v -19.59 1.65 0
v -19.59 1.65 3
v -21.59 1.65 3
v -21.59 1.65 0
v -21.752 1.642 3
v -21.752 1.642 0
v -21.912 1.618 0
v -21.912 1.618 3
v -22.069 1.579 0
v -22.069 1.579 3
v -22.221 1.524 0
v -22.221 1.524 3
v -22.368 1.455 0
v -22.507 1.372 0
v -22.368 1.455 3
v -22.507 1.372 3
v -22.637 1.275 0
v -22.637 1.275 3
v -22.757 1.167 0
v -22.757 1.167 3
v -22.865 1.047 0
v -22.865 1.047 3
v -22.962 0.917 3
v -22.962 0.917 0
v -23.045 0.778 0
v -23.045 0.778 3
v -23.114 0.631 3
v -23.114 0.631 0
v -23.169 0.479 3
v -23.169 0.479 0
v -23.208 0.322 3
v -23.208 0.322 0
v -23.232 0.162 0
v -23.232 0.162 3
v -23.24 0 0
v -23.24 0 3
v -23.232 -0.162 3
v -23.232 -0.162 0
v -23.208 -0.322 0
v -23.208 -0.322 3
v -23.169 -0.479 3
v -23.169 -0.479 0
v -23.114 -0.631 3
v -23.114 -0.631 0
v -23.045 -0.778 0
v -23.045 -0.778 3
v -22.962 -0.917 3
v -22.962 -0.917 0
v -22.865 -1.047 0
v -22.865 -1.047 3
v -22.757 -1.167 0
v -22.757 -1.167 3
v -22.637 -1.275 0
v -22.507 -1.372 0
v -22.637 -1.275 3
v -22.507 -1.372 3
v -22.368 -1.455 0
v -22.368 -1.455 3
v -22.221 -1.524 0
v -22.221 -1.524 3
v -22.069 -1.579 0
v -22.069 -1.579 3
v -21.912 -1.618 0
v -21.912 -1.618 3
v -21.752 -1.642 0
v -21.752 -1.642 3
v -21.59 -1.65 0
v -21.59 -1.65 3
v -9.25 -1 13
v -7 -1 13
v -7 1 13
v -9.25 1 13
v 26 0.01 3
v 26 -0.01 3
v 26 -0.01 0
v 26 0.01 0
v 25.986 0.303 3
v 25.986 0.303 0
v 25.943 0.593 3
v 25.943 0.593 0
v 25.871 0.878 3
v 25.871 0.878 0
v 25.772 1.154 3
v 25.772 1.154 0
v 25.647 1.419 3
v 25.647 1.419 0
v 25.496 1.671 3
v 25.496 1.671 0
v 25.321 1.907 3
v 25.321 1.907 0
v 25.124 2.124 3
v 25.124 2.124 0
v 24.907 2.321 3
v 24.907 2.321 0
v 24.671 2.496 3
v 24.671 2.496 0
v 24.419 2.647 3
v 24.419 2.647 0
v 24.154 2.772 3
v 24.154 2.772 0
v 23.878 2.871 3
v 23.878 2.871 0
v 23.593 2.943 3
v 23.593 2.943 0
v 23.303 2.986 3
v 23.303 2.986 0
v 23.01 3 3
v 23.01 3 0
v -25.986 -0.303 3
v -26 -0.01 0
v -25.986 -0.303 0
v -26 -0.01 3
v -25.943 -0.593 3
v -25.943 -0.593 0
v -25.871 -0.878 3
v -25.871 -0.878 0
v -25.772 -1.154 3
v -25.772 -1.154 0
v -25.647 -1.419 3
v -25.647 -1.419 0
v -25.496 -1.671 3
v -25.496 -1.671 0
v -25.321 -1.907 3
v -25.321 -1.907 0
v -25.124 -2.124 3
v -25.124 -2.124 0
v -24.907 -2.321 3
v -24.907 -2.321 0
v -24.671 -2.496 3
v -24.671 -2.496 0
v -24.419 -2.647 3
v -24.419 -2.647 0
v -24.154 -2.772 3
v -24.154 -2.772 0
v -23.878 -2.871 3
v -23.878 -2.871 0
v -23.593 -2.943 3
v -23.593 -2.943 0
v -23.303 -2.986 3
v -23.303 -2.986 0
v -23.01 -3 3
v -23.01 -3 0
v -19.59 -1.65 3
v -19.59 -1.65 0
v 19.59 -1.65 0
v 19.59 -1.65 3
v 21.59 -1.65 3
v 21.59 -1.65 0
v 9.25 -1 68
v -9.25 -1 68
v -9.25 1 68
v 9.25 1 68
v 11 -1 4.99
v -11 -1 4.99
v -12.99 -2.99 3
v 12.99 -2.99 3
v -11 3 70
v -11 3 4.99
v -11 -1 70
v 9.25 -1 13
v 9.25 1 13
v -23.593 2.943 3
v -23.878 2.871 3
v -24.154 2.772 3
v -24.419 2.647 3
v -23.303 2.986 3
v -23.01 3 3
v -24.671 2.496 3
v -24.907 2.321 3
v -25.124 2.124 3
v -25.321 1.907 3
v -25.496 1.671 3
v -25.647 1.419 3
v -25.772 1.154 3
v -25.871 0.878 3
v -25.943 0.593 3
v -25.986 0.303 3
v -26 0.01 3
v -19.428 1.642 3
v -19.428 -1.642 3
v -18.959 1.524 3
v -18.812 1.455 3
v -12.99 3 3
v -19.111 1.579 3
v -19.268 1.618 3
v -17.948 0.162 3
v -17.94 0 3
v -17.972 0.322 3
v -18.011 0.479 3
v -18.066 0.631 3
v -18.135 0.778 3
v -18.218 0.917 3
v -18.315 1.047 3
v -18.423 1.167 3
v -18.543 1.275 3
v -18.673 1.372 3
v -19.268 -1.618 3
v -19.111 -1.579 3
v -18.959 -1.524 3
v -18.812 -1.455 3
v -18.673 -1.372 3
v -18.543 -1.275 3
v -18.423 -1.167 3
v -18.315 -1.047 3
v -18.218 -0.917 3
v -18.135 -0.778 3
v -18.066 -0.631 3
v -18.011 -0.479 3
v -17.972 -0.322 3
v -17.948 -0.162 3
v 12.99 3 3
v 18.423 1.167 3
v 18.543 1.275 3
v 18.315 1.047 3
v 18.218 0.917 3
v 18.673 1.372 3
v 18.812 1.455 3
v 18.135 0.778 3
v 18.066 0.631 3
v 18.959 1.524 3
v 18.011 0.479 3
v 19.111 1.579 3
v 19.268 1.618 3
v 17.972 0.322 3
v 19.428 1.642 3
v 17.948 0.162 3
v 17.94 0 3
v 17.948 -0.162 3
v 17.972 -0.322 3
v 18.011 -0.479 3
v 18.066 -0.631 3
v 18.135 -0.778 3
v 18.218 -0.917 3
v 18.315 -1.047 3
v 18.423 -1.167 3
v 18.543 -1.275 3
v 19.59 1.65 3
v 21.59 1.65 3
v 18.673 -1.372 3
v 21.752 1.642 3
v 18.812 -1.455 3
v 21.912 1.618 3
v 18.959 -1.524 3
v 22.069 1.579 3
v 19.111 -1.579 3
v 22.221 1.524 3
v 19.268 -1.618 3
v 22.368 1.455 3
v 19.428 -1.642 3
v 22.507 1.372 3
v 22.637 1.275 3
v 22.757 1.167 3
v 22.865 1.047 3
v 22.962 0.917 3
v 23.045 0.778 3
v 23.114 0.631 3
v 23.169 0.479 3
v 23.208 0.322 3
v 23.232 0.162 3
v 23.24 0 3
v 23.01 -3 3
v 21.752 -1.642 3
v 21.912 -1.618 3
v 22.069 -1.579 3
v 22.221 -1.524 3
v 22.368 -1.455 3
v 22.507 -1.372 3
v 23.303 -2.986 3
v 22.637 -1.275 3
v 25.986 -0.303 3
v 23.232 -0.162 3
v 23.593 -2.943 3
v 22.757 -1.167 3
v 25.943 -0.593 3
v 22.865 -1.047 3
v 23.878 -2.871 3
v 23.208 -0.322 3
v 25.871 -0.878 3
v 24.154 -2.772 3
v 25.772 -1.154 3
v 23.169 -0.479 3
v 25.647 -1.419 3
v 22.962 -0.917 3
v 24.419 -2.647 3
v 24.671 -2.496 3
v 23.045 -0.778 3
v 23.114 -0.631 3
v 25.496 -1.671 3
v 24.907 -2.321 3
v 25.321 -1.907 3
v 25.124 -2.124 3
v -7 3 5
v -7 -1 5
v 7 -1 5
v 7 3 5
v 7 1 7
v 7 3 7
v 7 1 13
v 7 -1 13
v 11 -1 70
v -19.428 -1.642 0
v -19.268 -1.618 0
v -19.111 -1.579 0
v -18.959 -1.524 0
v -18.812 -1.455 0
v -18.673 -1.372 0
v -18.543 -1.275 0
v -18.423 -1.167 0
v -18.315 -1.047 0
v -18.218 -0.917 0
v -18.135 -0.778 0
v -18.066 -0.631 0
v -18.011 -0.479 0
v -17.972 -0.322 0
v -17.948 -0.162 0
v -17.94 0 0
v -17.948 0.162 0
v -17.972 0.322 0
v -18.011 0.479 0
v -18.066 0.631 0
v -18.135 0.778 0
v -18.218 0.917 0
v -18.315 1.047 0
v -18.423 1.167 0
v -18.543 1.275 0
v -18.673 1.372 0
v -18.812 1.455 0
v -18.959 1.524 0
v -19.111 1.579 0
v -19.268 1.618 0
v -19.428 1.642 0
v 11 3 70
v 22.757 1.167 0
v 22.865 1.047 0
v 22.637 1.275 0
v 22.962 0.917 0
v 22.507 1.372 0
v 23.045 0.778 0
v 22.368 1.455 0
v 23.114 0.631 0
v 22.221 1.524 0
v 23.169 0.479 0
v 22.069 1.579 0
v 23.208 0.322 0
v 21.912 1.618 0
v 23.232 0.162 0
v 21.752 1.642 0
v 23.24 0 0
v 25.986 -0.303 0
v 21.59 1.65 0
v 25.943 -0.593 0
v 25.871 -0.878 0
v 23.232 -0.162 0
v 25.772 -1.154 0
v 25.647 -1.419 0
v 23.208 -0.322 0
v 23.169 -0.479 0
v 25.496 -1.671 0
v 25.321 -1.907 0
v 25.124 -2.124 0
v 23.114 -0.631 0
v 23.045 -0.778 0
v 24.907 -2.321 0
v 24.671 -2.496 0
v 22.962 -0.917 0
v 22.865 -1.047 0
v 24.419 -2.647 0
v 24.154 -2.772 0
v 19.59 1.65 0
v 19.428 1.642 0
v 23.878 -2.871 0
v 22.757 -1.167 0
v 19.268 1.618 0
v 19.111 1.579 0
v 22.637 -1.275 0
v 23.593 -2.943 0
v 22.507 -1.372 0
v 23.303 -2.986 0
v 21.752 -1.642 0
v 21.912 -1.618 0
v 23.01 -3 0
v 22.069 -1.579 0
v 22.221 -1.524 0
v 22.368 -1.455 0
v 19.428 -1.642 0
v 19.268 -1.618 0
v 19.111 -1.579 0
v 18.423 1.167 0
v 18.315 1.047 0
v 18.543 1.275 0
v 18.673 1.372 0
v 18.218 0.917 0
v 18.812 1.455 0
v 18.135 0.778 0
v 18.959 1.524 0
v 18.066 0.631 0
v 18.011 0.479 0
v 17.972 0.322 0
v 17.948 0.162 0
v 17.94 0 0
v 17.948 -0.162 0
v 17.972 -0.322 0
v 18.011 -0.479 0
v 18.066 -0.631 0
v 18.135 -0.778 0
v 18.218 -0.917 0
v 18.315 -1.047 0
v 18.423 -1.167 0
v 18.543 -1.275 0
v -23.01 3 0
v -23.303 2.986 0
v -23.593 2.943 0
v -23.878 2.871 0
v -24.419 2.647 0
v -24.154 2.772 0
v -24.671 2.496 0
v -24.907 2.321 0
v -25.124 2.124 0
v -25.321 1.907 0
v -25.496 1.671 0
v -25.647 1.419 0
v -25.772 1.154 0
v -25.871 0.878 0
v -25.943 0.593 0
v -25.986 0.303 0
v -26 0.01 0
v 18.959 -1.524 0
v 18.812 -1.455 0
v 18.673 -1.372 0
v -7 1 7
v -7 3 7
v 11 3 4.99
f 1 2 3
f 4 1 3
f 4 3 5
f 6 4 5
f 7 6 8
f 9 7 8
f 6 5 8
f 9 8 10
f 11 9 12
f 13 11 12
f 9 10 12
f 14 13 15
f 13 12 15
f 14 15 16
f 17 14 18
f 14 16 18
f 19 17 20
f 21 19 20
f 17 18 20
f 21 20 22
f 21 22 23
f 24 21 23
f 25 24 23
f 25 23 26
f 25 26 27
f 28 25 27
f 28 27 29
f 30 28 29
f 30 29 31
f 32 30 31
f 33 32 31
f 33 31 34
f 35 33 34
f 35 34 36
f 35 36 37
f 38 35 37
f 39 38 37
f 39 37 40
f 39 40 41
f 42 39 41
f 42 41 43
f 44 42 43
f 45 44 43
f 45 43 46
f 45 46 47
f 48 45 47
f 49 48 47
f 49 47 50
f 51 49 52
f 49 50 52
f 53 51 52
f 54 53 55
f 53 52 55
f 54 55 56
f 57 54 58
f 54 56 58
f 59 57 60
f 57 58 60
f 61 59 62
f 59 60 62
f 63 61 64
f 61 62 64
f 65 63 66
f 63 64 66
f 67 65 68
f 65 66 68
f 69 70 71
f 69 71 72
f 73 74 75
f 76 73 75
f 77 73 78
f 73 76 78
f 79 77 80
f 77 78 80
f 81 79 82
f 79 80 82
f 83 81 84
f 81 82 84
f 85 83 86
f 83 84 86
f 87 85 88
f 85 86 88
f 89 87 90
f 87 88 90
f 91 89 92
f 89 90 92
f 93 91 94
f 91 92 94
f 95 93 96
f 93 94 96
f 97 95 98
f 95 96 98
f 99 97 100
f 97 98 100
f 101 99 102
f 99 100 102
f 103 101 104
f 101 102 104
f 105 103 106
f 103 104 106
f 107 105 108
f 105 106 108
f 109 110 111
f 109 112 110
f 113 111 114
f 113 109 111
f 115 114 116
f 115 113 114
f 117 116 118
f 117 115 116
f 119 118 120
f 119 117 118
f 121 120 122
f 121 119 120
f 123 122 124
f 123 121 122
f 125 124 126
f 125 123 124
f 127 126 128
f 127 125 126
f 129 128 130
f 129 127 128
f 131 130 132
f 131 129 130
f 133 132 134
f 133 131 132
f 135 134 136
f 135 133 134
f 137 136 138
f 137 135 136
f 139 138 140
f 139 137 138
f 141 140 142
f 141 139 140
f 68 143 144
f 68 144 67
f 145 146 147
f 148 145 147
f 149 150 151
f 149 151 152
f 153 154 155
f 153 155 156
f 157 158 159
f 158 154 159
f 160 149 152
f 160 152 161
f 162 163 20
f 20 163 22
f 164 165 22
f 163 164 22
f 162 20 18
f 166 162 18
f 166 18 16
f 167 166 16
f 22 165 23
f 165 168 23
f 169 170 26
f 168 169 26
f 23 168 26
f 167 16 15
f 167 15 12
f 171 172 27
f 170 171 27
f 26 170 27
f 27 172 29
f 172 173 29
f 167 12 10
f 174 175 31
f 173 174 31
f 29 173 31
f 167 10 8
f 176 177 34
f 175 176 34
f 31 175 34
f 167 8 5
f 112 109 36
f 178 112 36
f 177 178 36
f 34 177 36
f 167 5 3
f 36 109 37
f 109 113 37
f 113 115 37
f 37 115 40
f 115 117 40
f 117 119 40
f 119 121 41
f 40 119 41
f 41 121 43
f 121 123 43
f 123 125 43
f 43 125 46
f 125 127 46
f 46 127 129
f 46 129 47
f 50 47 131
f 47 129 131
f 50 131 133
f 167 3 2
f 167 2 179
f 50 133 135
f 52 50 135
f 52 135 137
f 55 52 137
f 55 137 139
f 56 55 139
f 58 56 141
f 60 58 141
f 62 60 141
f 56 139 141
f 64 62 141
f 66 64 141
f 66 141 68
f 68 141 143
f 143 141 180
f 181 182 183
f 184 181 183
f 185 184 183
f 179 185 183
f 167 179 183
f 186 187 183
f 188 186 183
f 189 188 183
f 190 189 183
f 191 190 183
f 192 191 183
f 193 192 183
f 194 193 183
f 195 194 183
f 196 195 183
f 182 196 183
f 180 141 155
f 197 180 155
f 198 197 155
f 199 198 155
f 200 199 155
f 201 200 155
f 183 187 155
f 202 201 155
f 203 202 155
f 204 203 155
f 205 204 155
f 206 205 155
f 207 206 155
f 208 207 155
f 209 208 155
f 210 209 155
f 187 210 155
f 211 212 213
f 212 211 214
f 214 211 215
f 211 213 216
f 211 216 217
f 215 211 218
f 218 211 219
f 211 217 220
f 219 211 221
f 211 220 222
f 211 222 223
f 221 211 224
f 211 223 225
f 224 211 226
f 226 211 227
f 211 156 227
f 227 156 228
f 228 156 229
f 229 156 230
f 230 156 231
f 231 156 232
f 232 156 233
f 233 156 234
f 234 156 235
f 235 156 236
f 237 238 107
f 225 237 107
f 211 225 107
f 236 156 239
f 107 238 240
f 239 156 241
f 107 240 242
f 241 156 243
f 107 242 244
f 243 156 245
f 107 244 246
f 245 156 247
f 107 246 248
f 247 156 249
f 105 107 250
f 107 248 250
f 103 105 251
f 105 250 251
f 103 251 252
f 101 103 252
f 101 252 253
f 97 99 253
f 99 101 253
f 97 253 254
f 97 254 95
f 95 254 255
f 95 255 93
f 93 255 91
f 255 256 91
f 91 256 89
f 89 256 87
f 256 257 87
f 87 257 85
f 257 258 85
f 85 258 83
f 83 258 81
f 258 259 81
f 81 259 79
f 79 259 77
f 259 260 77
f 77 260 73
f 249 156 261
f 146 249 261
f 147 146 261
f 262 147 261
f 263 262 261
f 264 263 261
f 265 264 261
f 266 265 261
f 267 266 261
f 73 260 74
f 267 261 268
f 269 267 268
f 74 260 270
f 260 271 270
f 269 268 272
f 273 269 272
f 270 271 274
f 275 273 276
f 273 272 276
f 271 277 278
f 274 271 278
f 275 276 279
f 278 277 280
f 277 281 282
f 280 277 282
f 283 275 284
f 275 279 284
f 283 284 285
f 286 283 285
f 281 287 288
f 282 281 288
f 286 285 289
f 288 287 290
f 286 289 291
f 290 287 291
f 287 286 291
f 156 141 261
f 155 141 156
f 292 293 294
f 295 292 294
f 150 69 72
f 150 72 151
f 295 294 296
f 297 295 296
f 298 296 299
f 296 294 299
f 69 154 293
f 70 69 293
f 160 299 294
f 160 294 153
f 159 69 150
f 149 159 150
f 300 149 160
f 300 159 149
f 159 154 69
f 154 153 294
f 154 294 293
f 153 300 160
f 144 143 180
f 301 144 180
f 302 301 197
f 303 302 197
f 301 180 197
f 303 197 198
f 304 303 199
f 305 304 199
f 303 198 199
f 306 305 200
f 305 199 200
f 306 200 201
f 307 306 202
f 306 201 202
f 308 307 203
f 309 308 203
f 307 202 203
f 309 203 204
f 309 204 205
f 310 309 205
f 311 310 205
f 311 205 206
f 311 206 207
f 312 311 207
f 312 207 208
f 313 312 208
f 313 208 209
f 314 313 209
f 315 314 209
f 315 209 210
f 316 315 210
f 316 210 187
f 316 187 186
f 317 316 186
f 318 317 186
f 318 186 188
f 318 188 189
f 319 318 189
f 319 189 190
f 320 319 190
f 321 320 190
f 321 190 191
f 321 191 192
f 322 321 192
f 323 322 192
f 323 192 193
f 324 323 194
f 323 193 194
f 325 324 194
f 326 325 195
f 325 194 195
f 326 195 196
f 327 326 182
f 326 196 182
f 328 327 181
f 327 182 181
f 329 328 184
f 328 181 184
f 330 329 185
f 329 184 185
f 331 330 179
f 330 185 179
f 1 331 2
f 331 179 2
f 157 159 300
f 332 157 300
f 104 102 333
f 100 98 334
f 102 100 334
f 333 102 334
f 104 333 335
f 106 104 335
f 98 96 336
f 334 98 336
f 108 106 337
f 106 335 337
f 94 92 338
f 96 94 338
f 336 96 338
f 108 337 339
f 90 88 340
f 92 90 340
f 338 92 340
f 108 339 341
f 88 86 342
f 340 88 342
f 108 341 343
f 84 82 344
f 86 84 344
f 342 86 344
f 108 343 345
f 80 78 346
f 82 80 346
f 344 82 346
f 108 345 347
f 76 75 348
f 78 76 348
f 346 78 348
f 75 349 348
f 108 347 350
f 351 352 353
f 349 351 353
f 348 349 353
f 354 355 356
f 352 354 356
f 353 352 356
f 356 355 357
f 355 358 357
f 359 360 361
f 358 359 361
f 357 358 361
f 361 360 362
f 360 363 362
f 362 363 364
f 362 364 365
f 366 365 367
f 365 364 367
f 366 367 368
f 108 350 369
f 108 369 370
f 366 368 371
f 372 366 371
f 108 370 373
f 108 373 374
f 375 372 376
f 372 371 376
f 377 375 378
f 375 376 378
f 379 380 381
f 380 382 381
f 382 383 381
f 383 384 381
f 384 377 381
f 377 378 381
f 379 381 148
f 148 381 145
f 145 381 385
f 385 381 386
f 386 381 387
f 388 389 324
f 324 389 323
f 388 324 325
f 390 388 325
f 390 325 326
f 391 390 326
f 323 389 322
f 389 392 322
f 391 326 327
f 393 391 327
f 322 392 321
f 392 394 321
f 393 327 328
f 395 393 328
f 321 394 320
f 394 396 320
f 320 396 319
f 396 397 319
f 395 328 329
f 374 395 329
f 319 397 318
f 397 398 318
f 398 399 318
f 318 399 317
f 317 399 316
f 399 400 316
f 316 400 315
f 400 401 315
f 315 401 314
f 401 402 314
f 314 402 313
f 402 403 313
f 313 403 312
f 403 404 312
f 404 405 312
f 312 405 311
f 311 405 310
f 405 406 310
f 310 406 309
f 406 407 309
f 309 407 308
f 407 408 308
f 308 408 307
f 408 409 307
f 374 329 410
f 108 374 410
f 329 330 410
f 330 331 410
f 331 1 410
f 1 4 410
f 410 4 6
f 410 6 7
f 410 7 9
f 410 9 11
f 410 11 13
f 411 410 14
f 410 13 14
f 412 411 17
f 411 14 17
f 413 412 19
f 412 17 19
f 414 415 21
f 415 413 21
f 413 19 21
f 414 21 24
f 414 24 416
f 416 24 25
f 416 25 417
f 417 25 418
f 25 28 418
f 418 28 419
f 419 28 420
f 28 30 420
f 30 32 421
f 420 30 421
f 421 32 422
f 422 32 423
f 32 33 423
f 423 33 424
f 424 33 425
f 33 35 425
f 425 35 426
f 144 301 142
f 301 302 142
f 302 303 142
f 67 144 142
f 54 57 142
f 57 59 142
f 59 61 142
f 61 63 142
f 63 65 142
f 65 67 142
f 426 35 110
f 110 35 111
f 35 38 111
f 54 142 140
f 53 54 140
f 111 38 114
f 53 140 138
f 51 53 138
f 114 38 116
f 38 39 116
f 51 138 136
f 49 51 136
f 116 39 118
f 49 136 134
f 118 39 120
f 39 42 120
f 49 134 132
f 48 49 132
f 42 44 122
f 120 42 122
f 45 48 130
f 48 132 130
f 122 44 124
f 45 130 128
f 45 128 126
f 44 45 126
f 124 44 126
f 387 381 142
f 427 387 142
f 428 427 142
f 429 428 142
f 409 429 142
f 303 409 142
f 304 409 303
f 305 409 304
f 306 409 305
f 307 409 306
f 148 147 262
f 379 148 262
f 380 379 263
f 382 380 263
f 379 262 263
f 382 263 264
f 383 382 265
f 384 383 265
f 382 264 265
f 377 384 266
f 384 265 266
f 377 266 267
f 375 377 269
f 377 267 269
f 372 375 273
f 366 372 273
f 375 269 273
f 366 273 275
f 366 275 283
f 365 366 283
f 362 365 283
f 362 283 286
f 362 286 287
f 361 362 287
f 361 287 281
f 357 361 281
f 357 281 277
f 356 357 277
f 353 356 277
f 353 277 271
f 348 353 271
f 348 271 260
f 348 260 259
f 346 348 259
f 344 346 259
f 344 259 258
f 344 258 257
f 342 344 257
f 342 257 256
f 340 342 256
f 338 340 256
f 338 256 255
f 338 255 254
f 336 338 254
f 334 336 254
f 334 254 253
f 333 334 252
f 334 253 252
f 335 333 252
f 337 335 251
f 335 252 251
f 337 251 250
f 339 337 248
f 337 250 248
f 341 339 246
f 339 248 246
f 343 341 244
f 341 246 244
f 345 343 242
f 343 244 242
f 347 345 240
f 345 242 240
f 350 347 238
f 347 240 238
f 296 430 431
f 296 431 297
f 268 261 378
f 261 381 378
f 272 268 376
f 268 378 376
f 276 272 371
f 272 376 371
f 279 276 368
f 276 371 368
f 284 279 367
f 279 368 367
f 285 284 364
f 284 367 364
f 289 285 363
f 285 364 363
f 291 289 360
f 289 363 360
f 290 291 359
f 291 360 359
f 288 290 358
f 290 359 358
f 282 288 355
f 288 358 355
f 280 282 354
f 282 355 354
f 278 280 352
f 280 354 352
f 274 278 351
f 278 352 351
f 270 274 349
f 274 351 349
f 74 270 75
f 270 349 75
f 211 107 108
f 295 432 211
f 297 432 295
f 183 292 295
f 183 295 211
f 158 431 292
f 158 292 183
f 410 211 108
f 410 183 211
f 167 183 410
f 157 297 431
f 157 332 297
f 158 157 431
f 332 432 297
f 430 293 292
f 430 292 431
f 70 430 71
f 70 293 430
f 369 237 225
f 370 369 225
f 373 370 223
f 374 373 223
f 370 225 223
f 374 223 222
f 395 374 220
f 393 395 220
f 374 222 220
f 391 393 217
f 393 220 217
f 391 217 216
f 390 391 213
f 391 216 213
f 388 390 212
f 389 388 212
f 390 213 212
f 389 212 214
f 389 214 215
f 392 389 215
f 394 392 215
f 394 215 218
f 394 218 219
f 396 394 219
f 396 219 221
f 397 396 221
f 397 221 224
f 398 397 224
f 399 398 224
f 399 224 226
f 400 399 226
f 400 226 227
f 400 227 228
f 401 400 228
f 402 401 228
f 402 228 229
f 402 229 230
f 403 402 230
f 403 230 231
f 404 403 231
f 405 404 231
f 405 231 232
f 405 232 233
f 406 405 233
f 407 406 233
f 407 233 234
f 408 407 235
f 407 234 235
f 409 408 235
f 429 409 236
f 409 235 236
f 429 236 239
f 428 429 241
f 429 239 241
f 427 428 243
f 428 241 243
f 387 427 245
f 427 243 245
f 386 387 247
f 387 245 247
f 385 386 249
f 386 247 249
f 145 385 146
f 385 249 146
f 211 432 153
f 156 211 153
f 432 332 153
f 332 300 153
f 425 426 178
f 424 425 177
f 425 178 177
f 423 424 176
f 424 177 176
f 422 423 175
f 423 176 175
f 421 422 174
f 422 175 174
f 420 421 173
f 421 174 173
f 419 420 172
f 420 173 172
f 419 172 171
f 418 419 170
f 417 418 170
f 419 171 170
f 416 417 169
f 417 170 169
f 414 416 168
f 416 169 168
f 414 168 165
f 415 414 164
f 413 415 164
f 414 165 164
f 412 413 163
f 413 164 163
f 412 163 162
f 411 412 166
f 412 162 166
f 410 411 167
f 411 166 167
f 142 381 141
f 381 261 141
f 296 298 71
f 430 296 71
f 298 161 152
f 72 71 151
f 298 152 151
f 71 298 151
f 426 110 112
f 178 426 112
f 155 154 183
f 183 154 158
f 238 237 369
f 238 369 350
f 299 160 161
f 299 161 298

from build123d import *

# Parameters (mm, degrees)
SKETCH_W        = 14
SKETCH_H        = 2
PAD_DEPTH       = 3
SKETCH001_W     = 22
SKETCH001_H     = 70
POCKET_DEPTH    = 2
POCKET001_DEPTH = 2
POCKET002_DEPTH = 3.001
CHAMFER_SIZE    = 1.99
CHAMFER001_SIZE = 1.99
FILLET_R        = 2.99


with BuildPart() as part:
    # Sketch → Pad (new body, symmetric)
    with BuildSketch(Plane.XZ):
        Polygon((-26, 0), (-26, 3), (-11, 3), (-11, 70), (11, 70), (11, 3), (26, 3), (26, 0), align=None)
        with Locations((0, 6)):
            Rectangle(SKETCH_W, SKETCH_H, mode=Mode.SUBTRACT)
    extrude(amount=PAD_DEPTH, both=True)

    # Sketch001 (on Face14 of Pad) → Pocket (cut)
    with BuildSketch(Plane.XZ.offset(3)):
        with Locations((0, 38)):
            Rectangle(SKETCH001_W, SKETCH001_H)
    extrude(amount=-POCKET_DEPTH, mode=Mode.SUBTRACT)

    # Sketch002 (on Face16 of Pocket) → Pocket001 (cut)
    with BuildSketch(Plane.XZ.offset(1)):
        Polygon((-9.25, 68), (9.25, 68), (9.25, 13), (7, 13), (7, 7), (-7, 7), (-7, 13), (-9.25, 13), align=None)
    extrude(amount=-POCKET001_DEPTH, mode=Mode.SUBTRACT)

    # Sketch003 (on Face3 of Pocket001) → Pocket002 (cut, through all)
    with BuildSketch(Plane(origin=(0, 0, 3), x_dir=(-1, 0, 0), z_dir=(0, 0, 1))):
        with BuildLine():
            ThreePointArc((-19.59, -1.65), (-17.94, 0), (-19.59, 1.65))
            Line((-19.59, 1.65), (-21.59, 1.65))
            ThreePointArc((-21.59, 1.65), (-23.24, 0), (-21.59, -1.65))
            Line((-19.59, -1.65), (-21.59, -1.65))
        make_face()
        with BuildLine():
            ThreePointArc((19.59, 1.65), (17.94, 0), (19.59, -1.65))
            Line((19.59, -1.65), (21.59, -1.65))
            ThreePointArc((21.59, -1.65), (23.24, 0), (21.59, 1.65))
            Line((19.59, 1.65), (21.59, 1.65))
        make_face()
    extrude(amount=-POCKET002_DEPTH, mode=Mode.SUBTRACT)

    # Chamfer
    chamfer_edges = [part.edges().sort_by_distance(p)[0] for p in [
        (0, -1, 3),
    ]]
    chamfer(chamfer_edges, length=CHAMFER_SIZE)

    # Chamfer001
    chamfer001_edges = [part.edges().sort_by_distance(p)[0] for p in [
        (-11, 1, 3),
        (11, 1, 3),
    ]]
    chamfer(chamfer001_edges, length=CHAMFER001_SIZE)

    # Fillet
    fillet_edges = [part.edges().sort_by_distance(p)[0] for p in [
        (-26, 3, 1.5),
        (-26, -3, 1.5),
        (26, -3, 1.5),
        (26, 3, 1.5),
    ]]
    fillet(fillet_edges, radius=FILLET_R)


solid = part.part
